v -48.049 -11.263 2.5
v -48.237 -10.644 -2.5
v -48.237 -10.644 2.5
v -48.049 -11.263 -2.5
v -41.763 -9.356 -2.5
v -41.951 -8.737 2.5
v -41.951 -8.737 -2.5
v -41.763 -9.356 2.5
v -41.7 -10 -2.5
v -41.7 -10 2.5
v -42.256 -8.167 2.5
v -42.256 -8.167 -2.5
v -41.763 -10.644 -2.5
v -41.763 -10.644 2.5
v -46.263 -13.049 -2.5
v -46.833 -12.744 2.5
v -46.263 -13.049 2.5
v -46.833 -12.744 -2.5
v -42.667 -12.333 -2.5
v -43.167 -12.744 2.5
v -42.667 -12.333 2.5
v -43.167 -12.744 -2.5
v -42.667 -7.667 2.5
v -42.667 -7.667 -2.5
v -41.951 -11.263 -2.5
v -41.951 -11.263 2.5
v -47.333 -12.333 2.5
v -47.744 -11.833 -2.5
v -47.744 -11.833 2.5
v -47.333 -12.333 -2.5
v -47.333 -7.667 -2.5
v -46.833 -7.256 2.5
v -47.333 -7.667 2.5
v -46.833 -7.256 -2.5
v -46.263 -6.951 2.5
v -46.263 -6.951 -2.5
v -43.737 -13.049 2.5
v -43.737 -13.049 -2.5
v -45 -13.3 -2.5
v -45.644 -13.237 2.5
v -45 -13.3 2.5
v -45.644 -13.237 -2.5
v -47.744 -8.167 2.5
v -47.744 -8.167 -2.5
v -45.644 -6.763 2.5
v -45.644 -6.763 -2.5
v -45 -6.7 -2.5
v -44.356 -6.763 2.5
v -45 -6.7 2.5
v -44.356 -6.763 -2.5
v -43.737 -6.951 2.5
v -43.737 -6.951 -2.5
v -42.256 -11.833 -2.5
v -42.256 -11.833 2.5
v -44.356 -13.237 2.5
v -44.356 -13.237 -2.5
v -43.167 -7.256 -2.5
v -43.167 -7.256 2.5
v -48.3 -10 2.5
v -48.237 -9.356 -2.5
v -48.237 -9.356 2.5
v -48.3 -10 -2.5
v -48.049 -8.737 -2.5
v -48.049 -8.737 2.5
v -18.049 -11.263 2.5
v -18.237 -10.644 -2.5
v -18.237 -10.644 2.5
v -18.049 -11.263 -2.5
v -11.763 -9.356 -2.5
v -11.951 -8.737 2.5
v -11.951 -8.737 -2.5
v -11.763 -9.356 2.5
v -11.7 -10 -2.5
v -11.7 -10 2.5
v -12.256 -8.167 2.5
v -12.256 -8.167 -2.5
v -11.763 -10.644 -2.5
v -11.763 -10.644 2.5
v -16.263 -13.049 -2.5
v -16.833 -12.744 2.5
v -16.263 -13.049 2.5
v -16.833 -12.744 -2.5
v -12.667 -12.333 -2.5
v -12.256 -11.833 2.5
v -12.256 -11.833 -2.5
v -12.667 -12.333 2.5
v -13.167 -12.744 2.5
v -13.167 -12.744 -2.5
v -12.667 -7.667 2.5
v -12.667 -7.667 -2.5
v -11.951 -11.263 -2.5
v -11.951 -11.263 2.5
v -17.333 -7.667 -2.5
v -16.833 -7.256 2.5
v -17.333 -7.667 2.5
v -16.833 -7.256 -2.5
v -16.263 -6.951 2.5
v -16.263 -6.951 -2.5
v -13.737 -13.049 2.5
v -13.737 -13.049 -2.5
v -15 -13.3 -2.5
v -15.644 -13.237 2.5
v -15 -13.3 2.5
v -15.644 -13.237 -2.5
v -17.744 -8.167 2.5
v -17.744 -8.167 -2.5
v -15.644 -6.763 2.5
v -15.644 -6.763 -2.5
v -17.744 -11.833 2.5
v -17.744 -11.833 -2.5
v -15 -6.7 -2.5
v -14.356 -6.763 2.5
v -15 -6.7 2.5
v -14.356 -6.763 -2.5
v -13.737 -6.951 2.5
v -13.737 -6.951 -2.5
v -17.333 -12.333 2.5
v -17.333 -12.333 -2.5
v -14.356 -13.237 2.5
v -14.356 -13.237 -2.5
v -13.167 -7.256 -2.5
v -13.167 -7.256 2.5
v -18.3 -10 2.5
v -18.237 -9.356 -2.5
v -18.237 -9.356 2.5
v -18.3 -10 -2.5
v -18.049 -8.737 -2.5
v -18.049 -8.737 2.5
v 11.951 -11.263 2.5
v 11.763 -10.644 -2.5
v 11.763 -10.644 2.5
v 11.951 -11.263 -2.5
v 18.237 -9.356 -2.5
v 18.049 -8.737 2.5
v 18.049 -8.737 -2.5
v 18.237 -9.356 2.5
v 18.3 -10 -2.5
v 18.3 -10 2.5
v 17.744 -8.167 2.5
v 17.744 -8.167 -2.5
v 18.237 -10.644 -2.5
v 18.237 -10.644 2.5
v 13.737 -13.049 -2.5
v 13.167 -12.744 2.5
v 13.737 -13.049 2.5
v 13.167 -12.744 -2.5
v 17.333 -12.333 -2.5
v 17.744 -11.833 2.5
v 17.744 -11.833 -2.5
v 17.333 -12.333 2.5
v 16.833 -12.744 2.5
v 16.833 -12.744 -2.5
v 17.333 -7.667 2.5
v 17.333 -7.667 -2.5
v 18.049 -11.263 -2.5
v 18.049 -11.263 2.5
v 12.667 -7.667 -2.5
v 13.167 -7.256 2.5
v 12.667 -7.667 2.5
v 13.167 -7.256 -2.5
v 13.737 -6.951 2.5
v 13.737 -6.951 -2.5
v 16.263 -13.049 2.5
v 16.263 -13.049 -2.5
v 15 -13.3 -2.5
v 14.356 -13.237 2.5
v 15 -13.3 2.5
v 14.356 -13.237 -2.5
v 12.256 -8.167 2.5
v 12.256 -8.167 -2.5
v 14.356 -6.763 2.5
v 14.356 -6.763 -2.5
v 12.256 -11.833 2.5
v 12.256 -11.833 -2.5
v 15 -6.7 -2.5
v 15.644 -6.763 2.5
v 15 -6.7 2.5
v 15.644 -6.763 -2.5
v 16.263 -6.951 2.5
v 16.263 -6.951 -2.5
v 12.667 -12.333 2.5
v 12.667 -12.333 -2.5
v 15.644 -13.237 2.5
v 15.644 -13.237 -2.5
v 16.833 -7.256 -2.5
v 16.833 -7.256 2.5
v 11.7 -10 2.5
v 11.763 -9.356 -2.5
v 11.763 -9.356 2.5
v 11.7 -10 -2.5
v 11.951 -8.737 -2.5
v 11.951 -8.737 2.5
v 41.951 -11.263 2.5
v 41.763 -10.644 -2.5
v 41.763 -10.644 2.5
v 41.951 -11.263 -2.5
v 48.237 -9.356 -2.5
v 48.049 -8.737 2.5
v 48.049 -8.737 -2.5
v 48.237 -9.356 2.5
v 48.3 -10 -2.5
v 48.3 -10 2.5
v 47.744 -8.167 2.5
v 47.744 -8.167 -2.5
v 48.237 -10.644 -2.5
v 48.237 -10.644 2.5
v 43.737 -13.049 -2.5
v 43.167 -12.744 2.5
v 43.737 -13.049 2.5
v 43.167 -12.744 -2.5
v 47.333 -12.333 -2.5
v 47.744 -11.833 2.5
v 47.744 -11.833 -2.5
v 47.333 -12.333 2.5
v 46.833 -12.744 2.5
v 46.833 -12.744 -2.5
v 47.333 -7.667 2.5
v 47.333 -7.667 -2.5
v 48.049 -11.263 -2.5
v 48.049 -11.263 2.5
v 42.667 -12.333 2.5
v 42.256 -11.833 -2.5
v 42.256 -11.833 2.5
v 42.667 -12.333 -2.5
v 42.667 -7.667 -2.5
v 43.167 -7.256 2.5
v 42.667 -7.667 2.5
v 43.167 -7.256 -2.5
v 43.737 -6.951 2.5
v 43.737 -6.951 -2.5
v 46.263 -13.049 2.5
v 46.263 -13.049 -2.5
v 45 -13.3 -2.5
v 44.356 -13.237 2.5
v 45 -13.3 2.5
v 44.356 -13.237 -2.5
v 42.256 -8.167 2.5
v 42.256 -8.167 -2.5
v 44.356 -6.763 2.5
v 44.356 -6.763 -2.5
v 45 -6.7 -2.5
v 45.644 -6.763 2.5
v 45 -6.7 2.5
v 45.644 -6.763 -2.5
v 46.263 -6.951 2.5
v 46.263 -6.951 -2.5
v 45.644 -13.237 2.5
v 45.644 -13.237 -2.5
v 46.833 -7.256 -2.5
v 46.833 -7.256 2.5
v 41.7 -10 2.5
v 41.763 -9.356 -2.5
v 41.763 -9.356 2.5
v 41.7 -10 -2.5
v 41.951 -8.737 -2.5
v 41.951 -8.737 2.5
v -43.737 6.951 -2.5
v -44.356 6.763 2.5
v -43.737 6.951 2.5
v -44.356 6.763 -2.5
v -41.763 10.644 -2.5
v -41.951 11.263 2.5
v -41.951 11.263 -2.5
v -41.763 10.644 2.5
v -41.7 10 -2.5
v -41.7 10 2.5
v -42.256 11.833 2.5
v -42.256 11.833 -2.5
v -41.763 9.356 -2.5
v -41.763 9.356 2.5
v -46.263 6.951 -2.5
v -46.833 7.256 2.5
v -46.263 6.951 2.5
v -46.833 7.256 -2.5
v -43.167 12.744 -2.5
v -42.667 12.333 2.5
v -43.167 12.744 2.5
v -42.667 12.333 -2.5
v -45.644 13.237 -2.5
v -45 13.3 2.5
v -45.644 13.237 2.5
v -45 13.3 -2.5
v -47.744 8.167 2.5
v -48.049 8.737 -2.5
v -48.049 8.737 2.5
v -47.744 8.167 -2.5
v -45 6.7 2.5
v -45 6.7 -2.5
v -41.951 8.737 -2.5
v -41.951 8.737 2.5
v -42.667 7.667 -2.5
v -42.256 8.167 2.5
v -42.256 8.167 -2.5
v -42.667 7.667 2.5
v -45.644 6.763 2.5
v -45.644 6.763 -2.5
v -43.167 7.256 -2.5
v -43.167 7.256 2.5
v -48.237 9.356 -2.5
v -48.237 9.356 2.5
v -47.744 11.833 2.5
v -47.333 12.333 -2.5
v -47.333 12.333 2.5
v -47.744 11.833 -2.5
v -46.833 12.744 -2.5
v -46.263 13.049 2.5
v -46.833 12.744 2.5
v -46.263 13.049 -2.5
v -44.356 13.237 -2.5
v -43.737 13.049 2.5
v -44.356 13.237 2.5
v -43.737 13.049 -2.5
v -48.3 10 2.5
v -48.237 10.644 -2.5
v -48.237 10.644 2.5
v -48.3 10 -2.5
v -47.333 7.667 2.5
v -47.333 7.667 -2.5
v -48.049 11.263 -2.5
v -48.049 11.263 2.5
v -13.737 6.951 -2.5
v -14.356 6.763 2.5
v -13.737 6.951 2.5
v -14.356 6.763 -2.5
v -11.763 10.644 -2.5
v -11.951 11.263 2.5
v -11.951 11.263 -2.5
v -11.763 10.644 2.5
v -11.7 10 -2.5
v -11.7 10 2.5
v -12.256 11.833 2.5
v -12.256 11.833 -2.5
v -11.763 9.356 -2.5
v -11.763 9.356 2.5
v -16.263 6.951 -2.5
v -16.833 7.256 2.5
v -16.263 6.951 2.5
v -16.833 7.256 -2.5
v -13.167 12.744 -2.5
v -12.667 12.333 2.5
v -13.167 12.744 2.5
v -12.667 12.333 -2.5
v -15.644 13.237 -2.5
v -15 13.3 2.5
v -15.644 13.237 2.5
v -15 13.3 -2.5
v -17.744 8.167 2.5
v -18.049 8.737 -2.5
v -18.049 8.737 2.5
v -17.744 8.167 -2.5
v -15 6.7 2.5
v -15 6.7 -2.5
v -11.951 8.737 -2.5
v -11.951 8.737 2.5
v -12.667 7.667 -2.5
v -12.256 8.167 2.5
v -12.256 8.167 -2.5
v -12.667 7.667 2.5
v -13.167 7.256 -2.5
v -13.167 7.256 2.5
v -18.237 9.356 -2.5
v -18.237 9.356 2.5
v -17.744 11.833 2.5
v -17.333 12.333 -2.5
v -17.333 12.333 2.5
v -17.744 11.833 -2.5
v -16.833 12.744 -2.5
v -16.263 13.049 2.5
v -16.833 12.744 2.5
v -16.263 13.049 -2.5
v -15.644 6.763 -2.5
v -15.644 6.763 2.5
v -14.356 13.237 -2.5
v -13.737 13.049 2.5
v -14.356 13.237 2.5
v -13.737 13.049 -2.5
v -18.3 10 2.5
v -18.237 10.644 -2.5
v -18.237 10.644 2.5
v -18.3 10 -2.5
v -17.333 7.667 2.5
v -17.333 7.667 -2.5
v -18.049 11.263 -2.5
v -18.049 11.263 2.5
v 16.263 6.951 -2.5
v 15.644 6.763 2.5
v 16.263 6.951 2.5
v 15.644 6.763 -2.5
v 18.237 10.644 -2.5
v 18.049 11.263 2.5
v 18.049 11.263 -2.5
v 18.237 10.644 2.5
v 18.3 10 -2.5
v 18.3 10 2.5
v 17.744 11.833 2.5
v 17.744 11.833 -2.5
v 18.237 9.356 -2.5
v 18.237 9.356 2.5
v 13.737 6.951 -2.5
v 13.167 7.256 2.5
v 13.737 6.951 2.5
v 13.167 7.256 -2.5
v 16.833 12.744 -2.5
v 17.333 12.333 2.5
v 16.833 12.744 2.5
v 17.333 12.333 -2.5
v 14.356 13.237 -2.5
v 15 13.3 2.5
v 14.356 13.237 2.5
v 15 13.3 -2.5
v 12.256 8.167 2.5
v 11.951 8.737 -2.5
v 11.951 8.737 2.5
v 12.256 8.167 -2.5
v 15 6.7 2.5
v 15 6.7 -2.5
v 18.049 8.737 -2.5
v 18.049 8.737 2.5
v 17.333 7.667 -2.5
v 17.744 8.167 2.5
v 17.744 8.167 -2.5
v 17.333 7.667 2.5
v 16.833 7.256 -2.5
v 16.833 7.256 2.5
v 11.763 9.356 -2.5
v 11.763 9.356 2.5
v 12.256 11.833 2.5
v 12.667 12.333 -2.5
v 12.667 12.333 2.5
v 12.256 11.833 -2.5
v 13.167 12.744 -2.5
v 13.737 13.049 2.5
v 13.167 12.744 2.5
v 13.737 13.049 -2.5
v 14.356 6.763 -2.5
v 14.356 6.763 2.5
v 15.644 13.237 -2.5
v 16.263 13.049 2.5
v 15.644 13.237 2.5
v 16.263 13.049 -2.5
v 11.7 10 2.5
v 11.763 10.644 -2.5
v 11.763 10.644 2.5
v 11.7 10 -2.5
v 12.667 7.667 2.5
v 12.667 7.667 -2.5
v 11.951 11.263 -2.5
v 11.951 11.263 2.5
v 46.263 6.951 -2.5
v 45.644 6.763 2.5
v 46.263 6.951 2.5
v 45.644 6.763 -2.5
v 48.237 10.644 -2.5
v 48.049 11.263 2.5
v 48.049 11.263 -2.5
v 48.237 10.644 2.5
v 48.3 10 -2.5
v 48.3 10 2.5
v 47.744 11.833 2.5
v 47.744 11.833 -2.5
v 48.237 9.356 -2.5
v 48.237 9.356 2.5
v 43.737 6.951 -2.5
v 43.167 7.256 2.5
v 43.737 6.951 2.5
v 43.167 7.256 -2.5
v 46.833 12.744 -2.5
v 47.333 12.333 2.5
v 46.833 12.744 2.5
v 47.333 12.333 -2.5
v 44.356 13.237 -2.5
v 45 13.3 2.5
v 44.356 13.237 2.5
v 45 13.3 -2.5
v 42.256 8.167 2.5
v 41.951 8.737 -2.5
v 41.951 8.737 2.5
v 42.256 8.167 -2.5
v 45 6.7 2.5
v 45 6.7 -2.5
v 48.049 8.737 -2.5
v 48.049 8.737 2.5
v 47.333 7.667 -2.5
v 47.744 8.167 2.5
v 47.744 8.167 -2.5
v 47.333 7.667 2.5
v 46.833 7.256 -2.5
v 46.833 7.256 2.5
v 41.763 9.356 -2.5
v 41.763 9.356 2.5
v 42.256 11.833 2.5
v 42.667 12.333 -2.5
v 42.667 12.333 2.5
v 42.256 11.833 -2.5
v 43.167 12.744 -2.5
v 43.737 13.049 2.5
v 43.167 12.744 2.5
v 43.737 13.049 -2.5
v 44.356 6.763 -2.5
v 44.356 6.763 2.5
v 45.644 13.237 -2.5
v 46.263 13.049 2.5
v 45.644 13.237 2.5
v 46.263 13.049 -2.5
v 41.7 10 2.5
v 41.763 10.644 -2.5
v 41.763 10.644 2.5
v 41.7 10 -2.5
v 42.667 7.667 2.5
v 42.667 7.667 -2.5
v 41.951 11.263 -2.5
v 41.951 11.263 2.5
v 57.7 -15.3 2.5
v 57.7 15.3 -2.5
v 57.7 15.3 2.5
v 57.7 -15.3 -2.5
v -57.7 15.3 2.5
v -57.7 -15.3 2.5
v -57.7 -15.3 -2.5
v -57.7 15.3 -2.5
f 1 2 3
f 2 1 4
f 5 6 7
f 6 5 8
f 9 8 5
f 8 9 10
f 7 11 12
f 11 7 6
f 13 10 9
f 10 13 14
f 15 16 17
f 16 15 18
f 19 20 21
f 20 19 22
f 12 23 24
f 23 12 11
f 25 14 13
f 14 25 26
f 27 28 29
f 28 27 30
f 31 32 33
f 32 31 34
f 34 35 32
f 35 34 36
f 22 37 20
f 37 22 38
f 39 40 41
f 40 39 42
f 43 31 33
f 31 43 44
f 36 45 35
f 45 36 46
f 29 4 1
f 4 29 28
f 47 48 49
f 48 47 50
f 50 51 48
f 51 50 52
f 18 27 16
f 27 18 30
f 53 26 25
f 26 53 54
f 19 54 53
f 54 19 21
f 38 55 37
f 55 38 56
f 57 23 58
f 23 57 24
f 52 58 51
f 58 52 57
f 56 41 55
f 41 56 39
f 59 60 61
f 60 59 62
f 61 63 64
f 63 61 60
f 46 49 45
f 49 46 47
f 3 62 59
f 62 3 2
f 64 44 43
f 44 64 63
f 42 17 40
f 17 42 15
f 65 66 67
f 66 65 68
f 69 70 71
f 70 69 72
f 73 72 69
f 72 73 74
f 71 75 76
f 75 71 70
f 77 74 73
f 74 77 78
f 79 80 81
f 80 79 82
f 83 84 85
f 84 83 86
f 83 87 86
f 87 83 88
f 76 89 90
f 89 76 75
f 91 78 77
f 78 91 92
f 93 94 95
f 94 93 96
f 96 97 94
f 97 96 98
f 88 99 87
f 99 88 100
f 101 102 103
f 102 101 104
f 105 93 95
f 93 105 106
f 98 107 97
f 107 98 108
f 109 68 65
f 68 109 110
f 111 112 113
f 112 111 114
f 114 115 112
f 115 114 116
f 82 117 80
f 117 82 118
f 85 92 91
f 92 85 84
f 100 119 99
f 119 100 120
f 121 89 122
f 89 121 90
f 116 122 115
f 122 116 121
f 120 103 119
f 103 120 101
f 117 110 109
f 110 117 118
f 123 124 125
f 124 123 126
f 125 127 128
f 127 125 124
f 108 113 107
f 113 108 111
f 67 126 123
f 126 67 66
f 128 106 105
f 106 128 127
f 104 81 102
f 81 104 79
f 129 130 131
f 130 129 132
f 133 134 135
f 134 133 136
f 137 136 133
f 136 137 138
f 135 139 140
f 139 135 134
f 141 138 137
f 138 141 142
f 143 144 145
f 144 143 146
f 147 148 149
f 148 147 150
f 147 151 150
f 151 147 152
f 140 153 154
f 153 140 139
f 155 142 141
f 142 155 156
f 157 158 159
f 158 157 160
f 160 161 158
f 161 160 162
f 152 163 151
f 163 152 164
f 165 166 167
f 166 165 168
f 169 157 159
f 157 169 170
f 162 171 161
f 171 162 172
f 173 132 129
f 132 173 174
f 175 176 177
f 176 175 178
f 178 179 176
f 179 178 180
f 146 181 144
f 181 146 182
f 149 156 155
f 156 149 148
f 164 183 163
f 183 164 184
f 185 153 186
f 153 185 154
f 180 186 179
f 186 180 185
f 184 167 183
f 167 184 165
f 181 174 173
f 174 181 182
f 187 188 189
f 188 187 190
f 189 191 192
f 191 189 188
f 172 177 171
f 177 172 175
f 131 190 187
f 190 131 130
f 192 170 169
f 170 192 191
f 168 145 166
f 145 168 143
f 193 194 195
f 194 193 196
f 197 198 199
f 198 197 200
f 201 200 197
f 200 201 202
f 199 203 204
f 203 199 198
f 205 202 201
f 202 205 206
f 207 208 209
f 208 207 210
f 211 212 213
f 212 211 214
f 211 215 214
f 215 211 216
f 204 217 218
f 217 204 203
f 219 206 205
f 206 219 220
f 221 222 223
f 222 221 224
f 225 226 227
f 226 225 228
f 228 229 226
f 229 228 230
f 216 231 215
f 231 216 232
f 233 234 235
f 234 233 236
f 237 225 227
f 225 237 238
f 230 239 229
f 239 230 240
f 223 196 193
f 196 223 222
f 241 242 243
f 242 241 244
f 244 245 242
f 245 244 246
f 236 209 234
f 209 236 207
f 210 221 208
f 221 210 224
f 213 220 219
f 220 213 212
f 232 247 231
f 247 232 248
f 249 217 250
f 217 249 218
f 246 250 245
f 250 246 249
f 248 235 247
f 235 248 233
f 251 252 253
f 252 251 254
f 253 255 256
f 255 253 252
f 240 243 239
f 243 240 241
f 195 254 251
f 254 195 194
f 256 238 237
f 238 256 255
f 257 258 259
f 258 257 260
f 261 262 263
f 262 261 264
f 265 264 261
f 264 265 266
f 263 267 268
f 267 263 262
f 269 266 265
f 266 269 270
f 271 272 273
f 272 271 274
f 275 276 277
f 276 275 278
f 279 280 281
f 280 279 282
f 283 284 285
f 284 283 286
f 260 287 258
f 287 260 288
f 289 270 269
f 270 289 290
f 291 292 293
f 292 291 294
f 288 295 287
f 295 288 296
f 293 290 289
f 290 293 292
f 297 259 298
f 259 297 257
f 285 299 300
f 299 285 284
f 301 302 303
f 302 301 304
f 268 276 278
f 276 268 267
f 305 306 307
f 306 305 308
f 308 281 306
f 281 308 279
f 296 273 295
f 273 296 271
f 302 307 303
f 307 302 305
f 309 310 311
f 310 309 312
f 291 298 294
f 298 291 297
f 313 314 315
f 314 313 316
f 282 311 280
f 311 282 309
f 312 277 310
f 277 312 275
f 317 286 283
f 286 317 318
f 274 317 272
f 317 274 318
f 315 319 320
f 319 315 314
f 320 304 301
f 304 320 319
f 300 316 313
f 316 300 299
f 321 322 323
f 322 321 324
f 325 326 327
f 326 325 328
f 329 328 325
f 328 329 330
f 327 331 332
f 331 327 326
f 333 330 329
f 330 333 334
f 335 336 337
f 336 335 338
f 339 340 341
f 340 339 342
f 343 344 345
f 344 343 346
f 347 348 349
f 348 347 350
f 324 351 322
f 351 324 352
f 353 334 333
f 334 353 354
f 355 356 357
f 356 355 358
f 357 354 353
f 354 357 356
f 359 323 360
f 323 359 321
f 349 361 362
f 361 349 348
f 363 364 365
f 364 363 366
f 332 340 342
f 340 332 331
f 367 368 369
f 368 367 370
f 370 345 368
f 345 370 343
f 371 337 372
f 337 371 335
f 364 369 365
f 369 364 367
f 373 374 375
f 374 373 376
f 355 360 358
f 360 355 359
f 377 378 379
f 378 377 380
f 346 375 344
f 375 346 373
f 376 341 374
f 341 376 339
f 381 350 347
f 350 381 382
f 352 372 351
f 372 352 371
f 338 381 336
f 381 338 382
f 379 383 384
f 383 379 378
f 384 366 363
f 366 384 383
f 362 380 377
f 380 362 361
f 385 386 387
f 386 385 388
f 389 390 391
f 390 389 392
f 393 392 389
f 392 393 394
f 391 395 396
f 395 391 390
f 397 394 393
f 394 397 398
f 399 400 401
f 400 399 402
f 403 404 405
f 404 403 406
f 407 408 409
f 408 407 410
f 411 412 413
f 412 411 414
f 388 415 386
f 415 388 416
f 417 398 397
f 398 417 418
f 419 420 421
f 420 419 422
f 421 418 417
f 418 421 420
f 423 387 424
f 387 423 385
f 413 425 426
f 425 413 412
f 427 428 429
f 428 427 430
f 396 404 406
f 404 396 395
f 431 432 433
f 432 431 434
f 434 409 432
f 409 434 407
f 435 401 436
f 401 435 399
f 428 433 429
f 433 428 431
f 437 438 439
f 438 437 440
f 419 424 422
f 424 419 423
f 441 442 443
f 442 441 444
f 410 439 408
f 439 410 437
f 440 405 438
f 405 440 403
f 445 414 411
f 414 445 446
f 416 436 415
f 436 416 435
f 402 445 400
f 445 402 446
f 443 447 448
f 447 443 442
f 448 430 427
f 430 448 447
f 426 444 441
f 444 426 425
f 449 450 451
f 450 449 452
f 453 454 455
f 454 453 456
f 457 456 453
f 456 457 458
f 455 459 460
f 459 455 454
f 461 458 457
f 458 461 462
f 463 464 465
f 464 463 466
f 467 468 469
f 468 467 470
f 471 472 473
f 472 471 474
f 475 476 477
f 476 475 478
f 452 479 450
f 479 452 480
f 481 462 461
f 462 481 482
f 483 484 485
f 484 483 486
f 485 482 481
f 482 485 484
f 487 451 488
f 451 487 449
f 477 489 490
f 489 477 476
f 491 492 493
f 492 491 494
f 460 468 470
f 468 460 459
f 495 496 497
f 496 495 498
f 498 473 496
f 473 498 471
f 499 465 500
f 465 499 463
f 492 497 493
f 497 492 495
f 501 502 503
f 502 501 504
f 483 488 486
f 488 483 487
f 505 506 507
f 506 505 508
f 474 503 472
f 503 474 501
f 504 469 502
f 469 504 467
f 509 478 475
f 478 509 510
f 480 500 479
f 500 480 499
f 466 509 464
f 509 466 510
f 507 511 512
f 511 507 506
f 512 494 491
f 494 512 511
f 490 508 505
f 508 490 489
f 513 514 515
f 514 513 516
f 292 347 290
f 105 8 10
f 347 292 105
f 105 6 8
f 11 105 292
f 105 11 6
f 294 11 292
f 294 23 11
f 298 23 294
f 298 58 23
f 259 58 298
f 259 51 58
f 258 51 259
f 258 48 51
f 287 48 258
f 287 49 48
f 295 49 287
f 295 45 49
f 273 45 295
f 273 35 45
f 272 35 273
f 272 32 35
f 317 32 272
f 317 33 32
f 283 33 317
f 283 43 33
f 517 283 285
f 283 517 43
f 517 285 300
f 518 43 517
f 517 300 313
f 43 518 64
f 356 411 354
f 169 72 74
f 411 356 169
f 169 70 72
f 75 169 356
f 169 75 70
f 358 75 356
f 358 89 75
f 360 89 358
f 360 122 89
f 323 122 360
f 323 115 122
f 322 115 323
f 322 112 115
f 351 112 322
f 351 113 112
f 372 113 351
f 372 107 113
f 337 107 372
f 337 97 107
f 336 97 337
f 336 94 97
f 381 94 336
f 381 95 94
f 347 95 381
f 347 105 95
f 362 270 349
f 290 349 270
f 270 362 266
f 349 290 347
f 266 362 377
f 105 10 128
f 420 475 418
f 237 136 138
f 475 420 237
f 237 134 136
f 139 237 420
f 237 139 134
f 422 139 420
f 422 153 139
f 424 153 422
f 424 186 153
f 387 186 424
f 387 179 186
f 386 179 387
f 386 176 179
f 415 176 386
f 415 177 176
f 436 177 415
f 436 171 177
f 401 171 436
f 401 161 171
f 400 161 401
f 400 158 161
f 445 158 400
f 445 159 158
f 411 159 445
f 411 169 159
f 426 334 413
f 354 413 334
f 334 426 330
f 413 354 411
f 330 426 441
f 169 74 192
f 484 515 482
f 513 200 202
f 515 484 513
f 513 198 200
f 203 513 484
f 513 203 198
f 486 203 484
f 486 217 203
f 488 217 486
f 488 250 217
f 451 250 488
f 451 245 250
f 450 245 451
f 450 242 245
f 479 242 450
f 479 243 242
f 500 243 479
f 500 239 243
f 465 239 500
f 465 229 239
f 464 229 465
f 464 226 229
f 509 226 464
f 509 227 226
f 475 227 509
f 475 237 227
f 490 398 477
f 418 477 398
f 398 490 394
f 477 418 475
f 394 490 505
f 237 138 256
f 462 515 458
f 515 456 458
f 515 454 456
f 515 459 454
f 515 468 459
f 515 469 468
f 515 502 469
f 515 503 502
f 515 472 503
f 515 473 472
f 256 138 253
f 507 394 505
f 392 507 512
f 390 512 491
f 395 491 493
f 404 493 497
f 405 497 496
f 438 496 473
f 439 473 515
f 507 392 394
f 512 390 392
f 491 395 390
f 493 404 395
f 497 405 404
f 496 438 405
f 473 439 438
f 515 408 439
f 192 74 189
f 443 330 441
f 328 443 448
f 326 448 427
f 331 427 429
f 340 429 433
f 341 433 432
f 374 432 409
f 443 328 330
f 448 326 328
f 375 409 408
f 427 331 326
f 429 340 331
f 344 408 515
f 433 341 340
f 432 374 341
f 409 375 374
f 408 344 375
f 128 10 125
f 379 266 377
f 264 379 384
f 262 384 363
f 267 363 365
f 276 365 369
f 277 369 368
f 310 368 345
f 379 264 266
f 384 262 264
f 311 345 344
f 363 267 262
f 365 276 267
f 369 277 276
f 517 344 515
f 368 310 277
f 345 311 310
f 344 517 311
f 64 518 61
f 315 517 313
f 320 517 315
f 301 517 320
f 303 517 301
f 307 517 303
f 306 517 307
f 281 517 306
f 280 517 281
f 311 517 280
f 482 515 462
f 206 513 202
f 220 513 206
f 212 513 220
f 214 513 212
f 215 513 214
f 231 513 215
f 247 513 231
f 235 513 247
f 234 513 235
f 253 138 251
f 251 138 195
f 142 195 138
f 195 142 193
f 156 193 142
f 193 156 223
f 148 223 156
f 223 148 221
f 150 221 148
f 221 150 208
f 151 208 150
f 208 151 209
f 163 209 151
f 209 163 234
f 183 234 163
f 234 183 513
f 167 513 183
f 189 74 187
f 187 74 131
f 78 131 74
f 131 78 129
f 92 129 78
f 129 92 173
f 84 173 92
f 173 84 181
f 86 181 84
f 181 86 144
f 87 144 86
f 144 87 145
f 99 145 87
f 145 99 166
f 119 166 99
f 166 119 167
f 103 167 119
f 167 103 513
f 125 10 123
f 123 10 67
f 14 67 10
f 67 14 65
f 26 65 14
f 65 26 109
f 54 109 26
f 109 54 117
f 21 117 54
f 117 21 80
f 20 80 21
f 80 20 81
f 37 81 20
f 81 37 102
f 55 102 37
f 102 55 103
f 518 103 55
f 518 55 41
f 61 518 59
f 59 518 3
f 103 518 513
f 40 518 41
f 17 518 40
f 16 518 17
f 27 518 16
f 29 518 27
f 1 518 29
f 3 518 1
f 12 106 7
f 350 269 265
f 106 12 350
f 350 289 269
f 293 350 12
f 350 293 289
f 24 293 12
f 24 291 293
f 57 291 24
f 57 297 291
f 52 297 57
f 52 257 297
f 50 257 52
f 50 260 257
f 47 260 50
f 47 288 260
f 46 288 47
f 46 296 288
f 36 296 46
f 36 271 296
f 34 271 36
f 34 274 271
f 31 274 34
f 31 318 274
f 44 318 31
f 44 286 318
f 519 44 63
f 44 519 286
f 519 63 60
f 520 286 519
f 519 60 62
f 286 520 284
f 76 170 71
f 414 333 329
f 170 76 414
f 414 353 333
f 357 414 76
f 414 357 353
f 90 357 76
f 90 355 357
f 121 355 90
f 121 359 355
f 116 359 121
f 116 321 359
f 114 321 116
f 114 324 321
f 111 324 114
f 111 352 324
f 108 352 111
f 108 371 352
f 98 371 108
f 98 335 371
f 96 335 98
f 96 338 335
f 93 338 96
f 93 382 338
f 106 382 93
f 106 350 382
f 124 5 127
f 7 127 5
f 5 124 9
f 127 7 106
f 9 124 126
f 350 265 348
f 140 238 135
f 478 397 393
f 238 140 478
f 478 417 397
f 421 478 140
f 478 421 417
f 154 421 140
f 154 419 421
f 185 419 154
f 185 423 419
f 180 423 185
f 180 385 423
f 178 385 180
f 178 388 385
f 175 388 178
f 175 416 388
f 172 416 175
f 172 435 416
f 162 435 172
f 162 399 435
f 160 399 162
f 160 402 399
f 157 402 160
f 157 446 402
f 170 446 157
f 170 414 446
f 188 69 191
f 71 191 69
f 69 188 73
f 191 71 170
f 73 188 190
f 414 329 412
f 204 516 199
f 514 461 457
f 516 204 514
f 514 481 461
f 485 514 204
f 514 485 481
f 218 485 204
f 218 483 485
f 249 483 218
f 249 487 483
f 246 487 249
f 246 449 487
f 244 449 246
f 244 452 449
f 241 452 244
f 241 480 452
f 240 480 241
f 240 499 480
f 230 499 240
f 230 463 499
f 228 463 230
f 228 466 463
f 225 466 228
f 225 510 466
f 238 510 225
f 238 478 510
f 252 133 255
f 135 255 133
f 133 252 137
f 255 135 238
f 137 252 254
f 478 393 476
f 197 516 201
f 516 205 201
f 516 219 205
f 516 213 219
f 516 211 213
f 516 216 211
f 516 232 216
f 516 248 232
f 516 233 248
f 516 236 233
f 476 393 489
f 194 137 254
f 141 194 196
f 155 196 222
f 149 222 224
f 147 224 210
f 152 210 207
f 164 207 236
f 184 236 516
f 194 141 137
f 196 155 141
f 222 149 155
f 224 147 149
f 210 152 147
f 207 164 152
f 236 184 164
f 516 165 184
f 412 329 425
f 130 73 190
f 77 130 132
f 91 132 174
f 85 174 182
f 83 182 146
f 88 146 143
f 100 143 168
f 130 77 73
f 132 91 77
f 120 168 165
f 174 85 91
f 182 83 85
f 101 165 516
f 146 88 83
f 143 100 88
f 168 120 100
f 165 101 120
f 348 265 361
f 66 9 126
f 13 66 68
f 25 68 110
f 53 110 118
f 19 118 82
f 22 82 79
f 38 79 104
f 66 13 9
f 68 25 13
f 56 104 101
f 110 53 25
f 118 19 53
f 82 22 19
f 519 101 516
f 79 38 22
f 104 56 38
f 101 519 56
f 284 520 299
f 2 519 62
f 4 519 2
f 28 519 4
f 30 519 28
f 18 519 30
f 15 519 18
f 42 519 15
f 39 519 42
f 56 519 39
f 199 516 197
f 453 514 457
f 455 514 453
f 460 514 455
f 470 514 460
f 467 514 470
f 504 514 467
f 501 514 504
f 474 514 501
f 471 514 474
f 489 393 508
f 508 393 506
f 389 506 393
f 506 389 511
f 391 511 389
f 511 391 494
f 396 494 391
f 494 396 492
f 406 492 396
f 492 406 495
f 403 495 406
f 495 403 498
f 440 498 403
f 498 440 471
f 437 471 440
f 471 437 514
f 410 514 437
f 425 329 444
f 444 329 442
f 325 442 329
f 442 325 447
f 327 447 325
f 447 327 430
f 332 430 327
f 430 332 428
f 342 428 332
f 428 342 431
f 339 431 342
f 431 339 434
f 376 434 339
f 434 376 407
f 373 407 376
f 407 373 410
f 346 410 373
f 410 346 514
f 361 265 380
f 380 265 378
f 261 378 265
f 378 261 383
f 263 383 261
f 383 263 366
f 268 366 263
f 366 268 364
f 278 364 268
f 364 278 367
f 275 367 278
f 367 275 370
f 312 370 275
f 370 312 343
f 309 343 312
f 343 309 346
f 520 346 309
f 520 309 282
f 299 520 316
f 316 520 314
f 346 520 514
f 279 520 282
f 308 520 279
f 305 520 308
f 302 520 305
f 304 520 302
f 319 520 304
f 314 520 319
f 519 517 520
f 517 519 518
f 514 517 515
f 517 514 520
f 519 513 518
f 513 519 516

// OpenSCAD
$fn = 32;

// ----------------------------------------------------------------------
// Hole bar, 4 x Ø6.6
// tworows layout, 12.7 mm edge offset
// ----------------------------------------------------------------------

// --- parameters (mm) ---
bar_w = 30.6;     // bar width (Y)
bar_t = 5;        // bar thickness (Z)
holes = 4;        // holes per row
hole_d = 6.6;     // hole diameter
edge = 12.7;      // offset from the bar end to the first hole
pitch = 30;       // pitch between neighbouring holes
row_offset = 20;  // distance between the two rows

// --- derived feature positions (mm) ---
span = (holes - 1) * pitch;   // = 90   distance between the end holes
bar_l = span + 2 * edge;      // = 115.4   overall bar length
start_x = -bar_l / 2 + edge;  // = -45   X of the first hole
feature_centers = [
  [start_x + 0 * pitch, -row_offset / 2],
  [start_x + 1 * pitch, -row_offset / 2],
  [start_x + 2 * pitch, -row_offset / 2],
  [start_x + 3 * pitch, -row_offset / 2]
];   // hole centres of the first row
row2_centers = [
  [start_x + 0 * pitch, row_offset / 2],
  [start_x + 1 * pitch, row_offset / 2],
  [start_x + 2 * pitch, row_offset / 2],
  [start_x + 3 * pitch, row_offset / 2]
];   // hole centres of the second row

// bar with two rows of holes, both read from their own centre arrays
difference() {
  translate([-bar_l / 2, -bar_w / 2, -bar_t / 2]) cube([bar_l, bar_w, bar_t]);
  for (centre = feature_centers)
    translate([centre[0], centre[1], 0])
      cylinder(d = hole_d, h = bar_t + 2, center = true);
  for (centre = row2_centers)
    translate([centre[0], centre[1], 0])
      cylinder(d = hole_d, h = bar_t + 2, center = true);
}
